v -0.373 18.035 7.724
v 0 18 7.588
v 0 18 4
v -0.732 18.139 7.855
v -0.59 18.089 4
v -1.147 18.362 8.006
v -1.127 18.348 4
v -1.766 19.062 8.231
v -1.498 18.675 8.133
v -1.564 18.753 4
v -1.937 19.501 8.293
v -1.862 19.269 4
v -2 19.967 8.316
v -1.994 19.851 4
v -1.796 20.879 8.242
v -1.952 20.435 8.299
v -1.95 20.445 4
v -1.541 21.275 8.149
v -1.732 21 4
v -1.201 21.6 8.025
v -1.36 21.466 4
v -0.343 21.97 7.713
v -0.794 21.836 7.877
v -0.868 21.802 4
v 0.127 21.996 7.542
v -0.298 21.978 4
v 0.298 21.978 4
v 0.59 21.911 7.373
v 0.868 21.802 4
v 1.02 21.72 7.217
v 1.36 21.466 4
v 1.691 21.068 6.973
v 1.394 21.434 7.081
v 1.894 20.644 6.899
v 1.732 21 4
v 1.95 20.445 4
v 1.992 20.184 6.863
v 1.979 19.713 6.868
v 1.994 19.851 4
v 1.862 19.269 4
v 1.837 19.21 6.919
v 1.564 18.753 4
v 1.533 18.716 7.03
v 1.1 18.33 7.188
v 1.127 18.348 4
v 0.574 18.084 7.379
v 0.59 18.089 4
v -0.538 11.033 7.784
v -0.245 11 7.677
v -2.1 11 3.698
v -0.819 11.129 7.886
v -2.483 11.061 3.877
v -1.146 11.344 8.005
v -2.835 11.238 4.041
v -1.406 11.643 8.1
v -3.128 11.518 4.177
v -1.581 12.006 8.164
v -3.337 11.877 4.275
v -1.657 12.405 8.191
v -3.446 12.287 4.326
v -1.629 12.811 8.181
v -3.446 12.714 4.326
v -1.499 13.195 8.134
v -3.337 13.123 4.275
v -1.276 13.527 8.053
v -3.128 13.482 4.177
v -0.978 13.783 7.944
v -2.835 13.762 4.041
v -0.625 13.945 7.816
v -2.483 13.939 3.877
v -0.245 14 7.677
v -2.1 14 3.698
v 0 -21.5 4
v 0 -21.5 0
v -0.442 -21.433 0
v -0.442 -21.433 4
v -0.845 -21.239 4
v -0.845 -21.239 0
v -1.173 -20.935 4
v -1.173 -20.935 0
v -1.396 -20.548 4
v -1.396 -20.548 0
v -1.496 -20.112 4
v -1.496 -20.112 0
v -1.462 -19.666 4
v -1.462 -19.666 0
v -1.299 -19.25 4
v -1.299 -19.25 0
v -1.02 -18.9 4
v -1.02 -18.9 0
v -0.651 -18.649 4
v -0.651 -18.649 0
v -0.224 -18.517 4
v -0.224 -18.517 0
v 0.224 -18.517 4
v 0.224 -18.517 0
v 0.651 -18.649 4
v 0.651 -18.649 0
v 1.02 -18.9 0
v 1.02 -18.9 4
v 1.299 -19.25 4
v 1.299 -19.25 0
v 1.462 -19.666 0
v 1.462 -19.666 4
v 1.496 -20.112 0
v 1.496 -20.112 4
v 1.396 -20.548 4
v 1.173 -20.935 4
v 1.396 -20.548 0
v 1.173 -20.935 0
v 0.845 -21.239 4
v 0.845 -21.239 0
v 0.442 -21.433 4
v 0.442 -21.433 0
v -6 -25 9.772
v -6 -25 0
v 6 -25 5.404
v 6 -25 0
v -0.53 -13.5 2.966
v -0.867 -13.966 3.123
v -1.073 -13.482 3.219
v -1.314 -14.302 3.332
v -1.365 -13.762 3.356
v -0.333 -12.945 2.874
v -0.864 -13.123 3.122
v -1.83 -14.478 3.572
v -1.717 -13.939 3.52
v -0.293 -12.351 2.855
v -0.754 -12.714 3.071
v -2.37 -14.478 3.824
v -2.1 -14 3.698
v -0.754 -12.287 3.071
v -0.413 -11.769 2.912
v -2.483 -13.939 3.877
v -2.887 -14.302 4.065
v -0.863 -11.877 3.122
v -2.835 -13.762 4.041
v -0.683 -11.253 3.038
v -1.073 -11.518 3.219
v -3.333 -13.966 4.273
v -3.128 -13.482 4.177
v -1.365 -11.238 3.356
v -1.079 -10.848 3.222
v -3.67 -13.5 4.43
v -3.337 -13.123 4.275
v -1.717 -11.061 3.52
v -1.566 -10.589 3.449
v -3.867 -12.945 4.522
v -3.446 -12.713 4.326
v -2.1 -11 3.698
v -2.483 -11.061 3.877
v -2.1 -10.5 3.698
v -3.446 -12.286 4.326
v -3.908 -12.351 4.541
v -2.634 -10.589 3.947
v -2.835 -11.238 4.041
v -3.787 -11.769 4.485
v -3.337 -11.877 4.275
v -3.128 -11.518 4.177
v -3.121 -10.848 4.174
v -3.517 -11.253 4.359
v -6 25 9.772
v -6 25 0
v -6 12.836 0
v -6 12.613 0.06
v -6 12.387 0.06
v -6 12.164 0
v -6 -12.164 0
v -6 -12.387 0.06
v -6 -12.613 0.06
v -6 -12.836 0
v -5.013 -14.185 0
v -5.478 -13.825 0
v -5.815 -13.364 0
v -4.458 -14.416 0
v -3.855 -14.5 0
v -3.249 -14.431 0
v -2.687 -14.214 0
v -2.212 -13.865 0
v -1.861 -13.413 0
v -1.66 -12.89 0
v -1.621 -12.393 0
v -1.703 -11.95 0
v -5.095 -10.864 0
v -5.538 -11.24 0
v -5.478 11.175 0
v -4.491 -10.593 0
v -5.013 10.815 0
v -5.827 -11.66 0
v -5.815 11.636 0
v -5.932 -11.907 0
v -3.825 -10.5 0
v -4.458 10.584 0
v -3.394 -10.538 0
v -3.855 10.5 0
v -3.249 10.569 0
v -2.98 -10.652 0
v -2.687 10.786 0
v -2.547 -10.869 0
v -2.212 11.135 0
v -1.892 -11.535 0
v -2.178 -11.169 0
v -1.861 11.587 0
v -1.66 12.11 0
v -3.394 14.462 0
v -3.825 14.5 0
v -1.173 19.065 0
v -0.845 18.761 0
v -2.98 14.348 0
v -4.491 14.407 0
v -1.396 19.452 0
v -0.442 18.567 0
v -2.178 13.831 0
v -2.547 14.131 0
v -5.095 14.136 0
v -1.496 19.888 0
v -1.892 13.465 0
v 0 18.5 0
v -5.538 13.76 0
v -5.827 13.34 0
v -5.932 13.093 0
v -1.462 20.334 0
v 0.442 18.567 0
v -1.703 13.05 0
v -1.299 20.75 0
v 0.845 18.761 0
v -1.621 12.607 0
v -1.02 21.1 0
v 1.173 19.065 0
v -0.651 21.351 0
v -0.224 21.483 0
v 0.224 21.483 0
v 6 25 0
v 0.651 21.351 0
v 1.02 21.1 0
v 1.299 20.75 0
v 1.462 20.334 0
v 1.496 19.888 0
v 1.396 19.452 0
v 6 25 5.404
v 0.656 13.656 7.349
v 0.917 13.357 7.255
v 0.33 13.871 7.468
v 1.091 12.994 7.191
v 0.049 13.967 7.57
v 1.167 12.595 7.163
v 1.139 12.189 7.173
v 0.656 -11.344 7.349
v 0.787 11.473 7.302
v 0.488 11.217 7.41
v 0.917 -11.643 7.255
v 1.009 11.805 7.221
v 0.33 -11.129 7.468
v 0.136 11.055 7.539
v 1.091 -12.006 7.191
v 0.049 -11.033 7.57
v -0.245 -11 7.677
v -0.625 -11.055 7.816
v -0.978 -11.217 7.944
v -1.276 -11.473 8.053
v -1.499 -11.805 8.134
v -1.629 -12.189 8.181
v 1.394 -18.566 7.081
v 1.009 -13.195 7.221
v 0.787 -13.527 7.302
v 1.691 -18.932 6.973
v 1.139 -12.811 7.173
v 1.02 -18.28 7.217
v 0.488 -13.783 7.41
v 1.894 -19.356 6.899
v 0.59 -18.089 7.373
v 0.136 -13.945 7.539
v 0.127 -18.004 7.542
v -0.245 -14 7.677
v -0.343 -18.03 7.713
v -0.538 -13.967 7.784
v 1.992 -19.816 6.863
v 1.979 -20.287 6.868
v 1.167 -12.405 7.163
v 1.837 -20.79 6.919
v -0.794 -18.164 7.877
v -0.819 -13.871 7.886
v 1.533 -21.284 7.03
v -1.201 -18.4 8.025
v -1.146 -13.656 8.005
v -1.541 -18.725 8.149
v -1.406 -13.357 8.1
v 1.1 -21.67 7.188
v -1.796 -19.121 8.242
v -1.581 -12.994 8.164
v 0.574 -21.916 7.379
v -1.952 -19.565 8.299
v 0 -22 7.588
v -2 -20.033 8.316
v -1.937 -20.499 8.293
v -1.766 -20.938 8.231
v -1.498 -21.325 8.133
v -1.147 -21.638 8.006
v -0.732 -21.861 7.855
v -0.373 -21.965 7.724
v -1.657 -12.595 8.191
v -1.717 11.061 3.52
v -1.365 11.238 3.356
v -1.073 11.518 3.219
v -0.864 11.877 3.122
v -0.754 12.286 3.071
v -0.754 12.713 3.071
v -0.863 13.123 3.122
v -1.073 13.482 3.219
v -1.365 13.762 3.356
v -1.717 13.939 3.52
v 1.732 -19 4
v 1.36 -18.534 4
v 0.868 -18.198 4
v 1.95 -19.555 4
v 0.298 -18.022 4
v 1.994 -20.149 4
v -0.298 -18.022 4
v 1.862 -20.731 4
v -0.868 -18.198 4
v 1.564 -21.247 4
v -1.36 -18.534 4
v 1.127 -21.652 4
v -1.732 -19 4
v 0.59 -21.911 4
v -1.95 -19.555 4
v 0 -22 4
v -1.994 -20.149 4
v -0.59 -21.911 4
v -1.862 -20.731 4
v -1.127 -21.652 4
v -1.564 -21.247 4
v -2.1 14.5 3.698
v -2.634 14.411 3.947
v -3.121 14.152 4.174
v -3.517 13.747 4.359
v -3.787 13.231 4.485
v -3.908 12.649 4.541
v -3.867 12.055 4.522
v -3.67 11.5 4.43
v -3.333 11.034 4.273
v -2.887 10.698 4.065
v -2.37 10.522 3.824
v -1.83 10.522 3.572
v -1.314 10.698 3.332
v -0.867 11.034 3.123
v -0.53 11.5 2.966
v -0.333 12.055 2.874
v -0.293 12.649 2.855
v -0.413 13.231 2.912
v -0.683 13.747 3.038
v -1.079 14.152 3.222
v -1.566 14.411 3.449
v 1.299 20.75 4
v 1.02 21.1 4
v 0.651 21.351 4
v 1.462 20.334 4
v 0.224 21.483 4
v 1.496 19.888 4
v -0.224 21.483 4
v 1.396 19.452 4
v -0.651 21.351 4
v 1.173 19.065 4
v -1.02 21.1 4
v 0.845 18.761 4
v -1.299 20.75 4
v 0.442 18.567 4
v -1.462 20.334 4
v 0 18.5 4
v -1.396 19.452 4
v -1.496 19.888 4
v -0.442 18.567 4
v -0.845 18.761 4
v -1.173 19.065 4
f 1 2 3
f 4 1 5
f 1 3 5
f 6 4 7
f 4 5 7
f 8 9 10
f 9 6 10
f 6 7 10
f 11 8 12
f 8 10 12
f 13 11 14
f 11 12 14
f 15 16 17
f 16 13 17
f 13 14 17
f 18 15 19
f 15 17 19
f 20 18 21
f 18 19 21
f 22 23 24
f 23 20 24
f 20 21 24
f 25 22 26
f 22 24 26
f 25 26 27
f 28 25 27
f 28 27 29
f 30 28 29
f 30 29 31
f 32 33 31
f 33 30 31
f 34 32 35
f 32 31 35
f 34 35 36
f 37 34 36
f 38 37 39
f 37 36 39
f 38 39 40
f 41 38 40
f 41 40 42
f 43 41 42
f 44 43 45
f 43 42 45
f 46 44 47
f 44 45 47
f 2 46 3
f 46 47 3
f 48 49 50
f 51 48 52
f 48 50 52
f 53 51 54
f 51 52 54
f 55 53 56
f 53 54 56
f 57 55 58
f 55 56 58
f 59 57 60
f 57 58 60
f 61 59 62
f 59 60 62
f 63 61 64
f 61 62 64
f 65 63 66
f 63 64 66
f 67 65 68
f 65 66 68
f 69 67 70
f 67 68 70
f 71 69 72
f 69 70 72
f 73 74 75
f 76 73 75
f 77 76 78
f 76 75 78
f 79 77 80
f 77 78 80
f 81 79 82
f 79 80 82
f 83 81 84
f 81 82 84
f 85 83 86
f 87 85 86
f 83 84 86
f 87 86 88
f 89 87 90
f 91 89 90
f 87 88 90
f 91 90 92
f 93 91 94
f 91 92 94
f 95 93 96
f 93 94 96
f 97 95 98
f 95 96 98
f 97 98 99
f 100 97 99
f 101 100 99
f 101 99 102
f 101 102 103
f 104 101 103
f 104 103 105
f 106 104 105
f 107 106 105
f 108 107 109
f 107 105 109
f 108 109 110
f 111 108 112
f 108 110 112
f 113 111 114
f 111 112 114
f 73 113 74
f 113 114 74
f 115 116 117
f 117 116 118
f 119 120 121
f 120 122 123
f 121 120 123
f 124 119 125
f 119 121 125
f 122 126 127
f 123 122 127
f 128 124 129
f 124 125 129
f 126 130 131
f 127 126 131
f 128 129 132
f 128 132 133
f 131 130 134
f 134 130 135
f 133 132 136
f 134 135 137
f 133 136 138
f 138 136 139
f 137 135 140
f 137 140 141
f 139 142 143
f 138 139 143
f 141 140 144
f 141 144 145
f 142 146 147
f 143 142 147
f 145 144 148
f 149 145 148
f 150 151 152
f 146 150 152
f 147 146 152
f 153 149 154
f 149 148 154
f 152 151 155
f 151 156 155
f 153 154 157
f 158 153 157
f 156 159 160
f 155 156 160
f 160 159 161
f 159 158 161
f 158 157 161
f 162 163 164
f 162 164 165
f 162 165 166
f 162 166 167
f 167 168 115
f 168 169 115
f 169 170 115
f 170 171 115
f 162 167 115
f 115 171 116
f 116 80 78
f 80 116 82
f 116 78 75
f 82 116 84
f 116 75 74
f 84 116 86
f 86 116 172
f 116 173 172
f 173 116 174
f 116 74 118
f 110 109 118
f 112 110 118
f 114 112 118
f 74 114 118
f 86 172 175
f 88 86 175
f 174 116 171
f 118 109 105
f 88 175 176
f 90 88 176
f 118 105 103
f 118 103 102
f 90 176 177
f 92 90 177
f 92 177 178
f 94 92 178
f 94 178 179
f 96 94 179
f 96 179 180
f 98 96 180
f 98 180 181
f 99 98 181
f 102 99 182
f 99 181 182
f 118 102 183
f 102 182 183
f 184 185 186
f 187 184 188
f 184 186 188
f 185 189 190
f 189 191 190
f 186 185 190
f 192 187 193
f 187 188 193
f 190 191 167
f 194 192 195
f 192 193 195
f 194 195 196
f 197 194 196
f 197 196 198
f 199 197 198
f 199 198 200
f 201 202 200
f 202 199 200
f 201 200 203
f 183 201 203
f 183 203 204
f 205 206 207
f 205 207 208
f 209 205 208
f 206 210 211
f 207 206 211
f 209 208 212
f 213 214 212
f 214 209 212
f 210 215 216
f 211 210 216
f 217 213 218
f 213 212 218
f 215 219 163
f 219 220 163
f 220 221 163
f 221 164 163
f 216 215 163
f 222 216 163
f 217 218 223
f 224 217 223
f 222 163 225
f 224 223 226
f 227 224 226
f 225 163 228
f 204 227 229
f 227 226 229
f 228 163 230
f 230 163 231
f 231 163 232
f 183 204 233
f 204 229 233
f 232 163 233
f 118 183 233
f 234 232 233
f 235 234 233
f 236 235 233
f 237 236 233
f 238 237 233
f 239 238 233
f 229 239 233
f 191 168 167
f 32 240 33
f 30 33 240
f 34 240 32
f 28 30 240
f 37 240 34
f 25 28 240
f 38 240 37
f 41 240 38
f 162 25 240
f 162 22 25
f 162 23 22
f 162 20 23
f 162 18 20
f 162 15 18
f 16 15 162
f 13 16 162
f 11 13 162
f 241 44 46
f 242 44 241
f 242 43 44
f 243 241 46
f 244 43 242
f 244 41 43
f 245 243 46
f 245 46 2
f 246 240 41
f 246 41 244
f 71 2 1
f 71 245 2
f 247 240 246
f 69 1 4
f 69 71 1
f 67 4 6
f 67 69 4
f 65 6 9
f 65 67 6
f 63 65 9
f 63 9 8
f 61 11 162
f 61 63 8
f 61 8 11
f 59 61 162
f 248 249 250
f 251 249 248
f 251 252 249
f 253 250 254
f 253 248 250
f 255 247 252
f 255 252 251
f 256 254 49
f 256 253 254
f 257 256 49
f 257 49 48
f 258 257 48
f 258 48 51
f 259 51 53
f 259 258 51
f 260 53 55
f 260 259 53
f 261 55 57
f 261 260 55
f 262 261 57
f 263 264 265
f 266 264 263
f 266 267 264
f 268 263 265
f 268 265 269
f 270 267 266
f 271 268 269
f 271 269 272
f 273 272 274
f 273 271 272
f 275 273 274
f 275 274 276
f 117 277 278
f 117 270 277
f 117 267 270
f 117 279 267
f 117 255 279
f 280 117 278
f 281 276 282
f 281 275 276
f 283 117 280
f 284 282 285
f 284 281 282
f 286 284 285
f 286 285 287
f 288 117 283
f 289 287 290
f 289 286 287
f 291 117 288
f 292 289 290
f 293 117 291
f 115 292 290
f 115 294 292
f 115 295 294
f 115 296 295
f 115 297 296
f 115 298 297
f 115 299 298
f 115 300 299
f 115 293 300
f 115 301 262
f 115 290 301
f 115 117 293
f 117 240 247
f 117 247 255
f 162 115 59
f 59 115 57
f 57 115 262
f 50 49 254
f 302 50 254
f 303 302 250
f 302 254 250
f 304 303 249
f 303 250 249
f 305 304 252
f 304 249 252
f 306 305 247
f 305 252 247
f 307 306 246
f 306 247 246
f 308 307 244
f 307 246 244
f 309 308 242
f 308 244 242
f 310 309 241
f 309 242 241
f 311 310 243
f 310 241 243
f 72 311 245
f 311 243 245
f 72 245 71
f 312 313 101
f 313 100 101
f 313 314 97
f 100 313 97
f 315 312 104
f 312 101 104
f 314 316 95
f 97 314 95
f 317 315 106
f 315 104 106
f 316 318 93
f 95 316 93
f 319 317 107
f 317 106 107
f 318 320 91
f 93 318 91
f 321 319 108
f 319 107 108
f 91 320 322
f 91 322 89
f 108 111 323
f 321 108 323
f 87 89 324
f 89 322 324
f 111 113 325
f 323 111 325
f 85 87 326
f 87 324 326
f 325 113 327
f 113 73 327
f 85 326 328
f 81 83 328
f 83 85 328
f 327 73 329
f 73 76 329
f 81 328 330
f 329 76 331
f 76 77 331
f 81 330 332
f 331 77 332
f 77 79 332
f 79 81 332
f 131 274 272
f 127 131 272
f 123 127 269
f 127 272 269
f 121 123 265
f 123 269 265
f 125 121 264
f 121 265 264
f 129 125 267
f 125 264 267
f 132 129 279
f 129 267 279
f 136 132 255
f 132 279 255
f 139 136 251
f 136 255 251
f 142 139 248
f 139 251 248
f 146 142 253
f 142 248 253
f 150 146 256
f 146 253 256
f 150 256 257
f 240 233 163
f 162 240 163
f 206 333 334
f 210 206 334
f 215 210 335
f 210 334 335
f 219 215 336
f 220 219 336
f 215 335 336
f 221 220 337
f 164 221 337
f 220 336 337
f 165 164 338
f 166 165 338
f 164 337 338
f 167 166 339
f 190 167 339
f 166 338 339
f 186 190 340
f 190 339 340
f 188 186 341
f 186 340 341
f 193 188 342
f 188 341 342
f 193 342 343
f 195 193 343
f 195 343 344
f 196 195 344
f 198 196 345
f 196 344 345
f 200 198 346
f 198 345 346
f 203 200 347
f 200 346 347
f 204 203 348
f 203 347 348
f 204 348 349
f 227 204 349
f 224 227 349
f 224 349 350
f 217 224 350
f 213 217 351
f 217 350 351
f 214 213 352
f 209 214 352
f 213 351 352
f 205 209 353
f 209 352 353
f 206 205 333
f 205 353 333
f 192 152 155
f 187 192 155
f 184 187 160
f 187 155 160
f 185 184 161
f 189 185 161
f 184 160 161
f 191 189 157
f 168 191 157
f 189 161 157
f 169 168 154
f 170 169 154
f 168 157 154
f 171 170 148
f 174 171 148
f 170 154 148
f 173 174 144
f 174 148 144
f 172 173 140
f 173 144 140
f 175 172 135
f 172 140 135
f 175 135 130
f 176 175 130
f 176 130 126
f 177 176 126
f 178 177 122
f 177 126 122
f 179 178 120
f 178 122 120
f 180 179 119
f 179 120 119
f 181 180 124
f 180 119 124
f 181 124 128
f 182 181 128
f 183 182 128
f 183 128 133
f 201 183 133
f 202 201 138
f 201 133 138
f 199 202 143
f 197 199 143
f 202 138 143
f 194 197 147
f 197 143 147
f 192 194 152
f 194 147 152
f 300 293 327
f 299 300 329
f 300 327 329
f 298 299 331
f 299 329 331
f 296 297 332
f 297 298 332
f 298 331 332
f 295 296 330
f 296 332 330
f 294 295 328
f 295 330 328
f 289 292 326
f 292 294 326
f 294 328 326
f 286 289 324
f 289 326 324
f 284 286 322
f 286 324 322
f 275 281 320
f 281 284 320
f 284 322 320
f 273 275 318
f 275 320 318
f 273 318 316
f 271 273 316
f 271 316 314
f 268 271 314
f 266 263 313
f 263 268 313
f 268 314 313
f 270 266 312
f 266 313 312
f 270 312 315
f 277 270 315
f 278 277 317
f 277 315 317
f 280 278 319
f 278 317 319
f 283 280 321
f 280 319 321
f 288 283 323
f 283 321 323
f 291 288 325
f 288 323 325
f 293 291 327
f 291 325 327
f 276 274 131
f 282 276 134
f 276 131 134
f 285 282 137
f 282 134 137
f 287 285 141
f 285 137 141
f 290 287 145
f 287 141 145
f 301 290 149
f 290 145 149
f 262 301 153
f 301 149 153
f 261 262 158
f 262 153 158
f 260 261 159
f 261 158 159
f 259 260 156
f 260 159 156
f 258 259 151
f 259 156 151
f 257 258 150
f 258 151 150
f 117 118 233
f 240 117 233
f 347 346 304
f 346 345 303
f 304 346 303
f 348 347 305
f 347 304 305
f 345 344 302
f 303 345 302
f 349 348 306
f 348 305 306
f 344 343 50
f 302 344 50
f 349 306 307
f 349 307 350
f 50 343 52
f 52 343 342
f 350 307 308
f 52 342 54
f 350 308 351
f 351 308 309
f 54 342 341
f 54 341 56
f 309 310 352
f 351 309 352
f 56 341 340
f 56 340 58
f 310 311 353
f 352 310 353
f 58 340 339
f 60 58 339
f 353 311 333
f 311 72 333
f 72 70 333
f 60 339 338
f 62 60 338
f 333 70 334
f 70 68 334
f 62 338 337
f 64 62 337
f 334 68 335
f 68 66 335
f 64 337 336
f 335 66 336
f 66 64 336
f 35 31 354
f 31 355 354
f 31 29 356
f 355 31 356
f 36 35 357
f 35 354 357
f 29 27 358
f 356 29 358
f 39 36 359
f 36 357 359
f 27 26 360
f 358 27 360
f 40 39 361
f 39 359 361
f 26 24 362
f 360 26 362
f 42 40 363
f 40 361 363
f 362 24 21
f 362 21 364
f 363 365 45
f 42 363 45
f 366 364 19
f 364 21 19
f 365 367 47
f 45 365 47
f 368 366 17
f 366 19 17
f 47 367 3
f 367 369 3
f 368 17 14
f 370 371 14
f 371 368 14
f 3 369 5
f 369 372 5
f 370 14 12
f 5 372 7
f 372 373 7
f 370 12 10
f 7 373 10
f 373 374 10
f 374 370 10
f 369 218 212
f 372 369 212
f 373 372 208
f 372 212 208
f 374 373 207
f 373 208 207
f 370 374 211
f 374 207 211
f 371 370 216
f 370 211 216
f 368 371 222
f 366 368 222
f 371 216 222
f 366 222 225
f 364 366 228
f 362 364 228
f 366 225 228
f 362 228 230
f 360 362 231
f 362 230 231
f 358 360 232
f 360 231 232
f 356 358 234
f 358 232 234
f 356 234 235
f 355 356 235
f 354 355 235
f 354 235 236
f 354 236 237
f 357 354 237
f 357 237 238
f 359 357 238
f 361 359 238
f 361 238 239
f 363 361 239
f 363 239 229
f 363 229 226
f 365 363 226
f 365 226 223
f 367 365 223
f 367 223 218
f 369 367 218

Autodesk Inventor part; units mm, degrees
ref_plane "YZ Plane" through (0, 0, 0) normal (1, 0, 0) x (0, 1, 0)
ref_plane "XZ Plane" through (0, 0, 0) normal (0, 1, 0) x (-1, 0, 0)
sketch "Skizze1" plane through (0, 0, 0) normal (0, 0, 1) x (1, 0, 0)
  line L0 (-6, -25) -> (6, -25)
  line L1 (6, -25) -> (6, 25)
  line L2 (6, 25) -> (-6, 25)
  line L3 (-6, 25) -> (-6, -25)
  line L4 (-6, -25) -> (6, 25) construction
  line L5 (6, -25) -> (-6, 25) construction
  line L6 (0, 20) -> (0, -20)
  point P0 (0, 0)
  point P1 (0, 0)
  dimension "d0" = 40
  dimension "d1" = 12
  dimension "d2" = 50
extrude "Extrusion1" add sketch "Skizze1" along normal blind 11
sketch "Skizze3" plane through (0, 0, 11) normal (0, 0, 1) x (1, 0, 0)
  line L0 (-6, -25) -> (6, -25) projected
  line L1 (6, -25) -> (6, 25) projected
  line L2 (6, 25) -> (-6, 25) projected
  line L3 (-6, 25) -> (-6, -25) projected
  point P0 (0, 0)
  point P1 (0, -20)
  point P2 (0, 20)
sketch "Skizze2" plane through (-6, -25, 0) normal (0, -1, 0) x (1, 0, 0)
  line L0 (0, 0) -> (12, 0) projected
  line L1 (12, 0) -> (12, 11) projected
  line L2 (0, 11) -> (12, 11) projected
  line L3 (0, 0) -> (0, 11) projected
  line L4 (0, 11) -> (12, 5.4043)
  point P0 (6, 0)
  dimension "d5" = 25
extrude "Extrusion2" cut sketch "Skizze2" against normal through all contours L2 L1 L4
hole "Bohrung1" at (0, 20, 11) at (0, -20, 11) direction (0, 0, -1) diameter 3 end through all counterbore diameter 4 counterbore depth 7
sketch "Skizze4" plane through (-6, -25, 11) normal (0.4226, 0, 0.9063) x (0.9063, 0, -0.4226)
  ellipse E0 centre (6.6203, 45) end of major axis (8.827, 45) minor radius 2 projected
  ellipse E1 centre (6.6203, 5) end of major axis (8.827, 5) minor radius 2 projected
  line L0 (0, 50) -> (13.2405, 50) projected
  line L1 (0, 50) -> (0, 0) projected
  line L2 (13.2405, 0) -> (0, 0) projected
  line L3 (13.2405, 50) -> (13.2405, 0) projected
  line L4 (6.6203, 12.5) -> (6.6203, 37.5)
  line L5 (0, 50) -> (0, 0) projected
  line L6 (0, 25) -> (13.2405, 25)
  line L7 (13.2405, 50) -> (13.2405, 0) projected
  point P0 (10.0866, 25)
  point P1 (6.6203, 25)
  dimension "d15" = 25
hole "Bohrung2" at (0, -12.5, 8.2022) at (0, 12.5, 8.2022) direction (-0.4226, 0, -0.9063) diameter 3 end through all
ref_plane "Arbeitsebene1" through (-6, 25, 0) normal (0.4226, 0, 0.9063) x (0.9063, 0, -0.4226)
sketch "Skizze5" plane through (-6, 25, 0) normal (0.4226, 0, 0.9063) x (0.9063, 0, -0.4226)
  circle A0 centre (1.9715, -37.5) radius 1.5 projected
  circle A1 centre (1.9715, -12.5) radius 1.5 projected
  ellipse E0 centre (1.9715, -5) end of major axis (4.1782, -5) minor radius 2 projected
  ellipse E1 centre (1.9715, -45) end of major axis (4.1782, -45) minor radius 2 projected
  line L0 (-4.6488, 0) -> (8.5917, 0) projected
  line L1 (-4.6488, 0) -> (-4.6488, -50) projected
  line L2 (8.5917, -50) -> (-4.6488, -50) projected
  line L3 (8.5917, 0) -> (8.5917, -50) projected
  point P0 (5.4378, -25)
hole "Bohrung3" at (-4.2132, 12.5, -0.8332) at (-4.2132, -12.5, -0.8332) direction (0.4226, 0, 0.9063) diameter 3 end through all counterbore diameter 4 counterbore depth 5
sketch "Skizze6" plane through (-6, -25, 0) normal (0, -1, 0) x (1, 0, 0)
  line L0 (12, 5.4043) -> (0, 11) projected
  line L1 (0, 0) -> (0, 11) projected
  line L2 (0, 0) -> (12, 0) projected
  line L3 (12, 0) -> (12, 5.4043) projected
  line L4 (12, 5.4043) -> (0, 9.772)
  point P0 (6, 0)
  dimension "d31" = 110
extrude "Extrusion3" cut sketch "Skizze6" against normal through all contours L4 L1 L0
properties part number "Mount_2"
